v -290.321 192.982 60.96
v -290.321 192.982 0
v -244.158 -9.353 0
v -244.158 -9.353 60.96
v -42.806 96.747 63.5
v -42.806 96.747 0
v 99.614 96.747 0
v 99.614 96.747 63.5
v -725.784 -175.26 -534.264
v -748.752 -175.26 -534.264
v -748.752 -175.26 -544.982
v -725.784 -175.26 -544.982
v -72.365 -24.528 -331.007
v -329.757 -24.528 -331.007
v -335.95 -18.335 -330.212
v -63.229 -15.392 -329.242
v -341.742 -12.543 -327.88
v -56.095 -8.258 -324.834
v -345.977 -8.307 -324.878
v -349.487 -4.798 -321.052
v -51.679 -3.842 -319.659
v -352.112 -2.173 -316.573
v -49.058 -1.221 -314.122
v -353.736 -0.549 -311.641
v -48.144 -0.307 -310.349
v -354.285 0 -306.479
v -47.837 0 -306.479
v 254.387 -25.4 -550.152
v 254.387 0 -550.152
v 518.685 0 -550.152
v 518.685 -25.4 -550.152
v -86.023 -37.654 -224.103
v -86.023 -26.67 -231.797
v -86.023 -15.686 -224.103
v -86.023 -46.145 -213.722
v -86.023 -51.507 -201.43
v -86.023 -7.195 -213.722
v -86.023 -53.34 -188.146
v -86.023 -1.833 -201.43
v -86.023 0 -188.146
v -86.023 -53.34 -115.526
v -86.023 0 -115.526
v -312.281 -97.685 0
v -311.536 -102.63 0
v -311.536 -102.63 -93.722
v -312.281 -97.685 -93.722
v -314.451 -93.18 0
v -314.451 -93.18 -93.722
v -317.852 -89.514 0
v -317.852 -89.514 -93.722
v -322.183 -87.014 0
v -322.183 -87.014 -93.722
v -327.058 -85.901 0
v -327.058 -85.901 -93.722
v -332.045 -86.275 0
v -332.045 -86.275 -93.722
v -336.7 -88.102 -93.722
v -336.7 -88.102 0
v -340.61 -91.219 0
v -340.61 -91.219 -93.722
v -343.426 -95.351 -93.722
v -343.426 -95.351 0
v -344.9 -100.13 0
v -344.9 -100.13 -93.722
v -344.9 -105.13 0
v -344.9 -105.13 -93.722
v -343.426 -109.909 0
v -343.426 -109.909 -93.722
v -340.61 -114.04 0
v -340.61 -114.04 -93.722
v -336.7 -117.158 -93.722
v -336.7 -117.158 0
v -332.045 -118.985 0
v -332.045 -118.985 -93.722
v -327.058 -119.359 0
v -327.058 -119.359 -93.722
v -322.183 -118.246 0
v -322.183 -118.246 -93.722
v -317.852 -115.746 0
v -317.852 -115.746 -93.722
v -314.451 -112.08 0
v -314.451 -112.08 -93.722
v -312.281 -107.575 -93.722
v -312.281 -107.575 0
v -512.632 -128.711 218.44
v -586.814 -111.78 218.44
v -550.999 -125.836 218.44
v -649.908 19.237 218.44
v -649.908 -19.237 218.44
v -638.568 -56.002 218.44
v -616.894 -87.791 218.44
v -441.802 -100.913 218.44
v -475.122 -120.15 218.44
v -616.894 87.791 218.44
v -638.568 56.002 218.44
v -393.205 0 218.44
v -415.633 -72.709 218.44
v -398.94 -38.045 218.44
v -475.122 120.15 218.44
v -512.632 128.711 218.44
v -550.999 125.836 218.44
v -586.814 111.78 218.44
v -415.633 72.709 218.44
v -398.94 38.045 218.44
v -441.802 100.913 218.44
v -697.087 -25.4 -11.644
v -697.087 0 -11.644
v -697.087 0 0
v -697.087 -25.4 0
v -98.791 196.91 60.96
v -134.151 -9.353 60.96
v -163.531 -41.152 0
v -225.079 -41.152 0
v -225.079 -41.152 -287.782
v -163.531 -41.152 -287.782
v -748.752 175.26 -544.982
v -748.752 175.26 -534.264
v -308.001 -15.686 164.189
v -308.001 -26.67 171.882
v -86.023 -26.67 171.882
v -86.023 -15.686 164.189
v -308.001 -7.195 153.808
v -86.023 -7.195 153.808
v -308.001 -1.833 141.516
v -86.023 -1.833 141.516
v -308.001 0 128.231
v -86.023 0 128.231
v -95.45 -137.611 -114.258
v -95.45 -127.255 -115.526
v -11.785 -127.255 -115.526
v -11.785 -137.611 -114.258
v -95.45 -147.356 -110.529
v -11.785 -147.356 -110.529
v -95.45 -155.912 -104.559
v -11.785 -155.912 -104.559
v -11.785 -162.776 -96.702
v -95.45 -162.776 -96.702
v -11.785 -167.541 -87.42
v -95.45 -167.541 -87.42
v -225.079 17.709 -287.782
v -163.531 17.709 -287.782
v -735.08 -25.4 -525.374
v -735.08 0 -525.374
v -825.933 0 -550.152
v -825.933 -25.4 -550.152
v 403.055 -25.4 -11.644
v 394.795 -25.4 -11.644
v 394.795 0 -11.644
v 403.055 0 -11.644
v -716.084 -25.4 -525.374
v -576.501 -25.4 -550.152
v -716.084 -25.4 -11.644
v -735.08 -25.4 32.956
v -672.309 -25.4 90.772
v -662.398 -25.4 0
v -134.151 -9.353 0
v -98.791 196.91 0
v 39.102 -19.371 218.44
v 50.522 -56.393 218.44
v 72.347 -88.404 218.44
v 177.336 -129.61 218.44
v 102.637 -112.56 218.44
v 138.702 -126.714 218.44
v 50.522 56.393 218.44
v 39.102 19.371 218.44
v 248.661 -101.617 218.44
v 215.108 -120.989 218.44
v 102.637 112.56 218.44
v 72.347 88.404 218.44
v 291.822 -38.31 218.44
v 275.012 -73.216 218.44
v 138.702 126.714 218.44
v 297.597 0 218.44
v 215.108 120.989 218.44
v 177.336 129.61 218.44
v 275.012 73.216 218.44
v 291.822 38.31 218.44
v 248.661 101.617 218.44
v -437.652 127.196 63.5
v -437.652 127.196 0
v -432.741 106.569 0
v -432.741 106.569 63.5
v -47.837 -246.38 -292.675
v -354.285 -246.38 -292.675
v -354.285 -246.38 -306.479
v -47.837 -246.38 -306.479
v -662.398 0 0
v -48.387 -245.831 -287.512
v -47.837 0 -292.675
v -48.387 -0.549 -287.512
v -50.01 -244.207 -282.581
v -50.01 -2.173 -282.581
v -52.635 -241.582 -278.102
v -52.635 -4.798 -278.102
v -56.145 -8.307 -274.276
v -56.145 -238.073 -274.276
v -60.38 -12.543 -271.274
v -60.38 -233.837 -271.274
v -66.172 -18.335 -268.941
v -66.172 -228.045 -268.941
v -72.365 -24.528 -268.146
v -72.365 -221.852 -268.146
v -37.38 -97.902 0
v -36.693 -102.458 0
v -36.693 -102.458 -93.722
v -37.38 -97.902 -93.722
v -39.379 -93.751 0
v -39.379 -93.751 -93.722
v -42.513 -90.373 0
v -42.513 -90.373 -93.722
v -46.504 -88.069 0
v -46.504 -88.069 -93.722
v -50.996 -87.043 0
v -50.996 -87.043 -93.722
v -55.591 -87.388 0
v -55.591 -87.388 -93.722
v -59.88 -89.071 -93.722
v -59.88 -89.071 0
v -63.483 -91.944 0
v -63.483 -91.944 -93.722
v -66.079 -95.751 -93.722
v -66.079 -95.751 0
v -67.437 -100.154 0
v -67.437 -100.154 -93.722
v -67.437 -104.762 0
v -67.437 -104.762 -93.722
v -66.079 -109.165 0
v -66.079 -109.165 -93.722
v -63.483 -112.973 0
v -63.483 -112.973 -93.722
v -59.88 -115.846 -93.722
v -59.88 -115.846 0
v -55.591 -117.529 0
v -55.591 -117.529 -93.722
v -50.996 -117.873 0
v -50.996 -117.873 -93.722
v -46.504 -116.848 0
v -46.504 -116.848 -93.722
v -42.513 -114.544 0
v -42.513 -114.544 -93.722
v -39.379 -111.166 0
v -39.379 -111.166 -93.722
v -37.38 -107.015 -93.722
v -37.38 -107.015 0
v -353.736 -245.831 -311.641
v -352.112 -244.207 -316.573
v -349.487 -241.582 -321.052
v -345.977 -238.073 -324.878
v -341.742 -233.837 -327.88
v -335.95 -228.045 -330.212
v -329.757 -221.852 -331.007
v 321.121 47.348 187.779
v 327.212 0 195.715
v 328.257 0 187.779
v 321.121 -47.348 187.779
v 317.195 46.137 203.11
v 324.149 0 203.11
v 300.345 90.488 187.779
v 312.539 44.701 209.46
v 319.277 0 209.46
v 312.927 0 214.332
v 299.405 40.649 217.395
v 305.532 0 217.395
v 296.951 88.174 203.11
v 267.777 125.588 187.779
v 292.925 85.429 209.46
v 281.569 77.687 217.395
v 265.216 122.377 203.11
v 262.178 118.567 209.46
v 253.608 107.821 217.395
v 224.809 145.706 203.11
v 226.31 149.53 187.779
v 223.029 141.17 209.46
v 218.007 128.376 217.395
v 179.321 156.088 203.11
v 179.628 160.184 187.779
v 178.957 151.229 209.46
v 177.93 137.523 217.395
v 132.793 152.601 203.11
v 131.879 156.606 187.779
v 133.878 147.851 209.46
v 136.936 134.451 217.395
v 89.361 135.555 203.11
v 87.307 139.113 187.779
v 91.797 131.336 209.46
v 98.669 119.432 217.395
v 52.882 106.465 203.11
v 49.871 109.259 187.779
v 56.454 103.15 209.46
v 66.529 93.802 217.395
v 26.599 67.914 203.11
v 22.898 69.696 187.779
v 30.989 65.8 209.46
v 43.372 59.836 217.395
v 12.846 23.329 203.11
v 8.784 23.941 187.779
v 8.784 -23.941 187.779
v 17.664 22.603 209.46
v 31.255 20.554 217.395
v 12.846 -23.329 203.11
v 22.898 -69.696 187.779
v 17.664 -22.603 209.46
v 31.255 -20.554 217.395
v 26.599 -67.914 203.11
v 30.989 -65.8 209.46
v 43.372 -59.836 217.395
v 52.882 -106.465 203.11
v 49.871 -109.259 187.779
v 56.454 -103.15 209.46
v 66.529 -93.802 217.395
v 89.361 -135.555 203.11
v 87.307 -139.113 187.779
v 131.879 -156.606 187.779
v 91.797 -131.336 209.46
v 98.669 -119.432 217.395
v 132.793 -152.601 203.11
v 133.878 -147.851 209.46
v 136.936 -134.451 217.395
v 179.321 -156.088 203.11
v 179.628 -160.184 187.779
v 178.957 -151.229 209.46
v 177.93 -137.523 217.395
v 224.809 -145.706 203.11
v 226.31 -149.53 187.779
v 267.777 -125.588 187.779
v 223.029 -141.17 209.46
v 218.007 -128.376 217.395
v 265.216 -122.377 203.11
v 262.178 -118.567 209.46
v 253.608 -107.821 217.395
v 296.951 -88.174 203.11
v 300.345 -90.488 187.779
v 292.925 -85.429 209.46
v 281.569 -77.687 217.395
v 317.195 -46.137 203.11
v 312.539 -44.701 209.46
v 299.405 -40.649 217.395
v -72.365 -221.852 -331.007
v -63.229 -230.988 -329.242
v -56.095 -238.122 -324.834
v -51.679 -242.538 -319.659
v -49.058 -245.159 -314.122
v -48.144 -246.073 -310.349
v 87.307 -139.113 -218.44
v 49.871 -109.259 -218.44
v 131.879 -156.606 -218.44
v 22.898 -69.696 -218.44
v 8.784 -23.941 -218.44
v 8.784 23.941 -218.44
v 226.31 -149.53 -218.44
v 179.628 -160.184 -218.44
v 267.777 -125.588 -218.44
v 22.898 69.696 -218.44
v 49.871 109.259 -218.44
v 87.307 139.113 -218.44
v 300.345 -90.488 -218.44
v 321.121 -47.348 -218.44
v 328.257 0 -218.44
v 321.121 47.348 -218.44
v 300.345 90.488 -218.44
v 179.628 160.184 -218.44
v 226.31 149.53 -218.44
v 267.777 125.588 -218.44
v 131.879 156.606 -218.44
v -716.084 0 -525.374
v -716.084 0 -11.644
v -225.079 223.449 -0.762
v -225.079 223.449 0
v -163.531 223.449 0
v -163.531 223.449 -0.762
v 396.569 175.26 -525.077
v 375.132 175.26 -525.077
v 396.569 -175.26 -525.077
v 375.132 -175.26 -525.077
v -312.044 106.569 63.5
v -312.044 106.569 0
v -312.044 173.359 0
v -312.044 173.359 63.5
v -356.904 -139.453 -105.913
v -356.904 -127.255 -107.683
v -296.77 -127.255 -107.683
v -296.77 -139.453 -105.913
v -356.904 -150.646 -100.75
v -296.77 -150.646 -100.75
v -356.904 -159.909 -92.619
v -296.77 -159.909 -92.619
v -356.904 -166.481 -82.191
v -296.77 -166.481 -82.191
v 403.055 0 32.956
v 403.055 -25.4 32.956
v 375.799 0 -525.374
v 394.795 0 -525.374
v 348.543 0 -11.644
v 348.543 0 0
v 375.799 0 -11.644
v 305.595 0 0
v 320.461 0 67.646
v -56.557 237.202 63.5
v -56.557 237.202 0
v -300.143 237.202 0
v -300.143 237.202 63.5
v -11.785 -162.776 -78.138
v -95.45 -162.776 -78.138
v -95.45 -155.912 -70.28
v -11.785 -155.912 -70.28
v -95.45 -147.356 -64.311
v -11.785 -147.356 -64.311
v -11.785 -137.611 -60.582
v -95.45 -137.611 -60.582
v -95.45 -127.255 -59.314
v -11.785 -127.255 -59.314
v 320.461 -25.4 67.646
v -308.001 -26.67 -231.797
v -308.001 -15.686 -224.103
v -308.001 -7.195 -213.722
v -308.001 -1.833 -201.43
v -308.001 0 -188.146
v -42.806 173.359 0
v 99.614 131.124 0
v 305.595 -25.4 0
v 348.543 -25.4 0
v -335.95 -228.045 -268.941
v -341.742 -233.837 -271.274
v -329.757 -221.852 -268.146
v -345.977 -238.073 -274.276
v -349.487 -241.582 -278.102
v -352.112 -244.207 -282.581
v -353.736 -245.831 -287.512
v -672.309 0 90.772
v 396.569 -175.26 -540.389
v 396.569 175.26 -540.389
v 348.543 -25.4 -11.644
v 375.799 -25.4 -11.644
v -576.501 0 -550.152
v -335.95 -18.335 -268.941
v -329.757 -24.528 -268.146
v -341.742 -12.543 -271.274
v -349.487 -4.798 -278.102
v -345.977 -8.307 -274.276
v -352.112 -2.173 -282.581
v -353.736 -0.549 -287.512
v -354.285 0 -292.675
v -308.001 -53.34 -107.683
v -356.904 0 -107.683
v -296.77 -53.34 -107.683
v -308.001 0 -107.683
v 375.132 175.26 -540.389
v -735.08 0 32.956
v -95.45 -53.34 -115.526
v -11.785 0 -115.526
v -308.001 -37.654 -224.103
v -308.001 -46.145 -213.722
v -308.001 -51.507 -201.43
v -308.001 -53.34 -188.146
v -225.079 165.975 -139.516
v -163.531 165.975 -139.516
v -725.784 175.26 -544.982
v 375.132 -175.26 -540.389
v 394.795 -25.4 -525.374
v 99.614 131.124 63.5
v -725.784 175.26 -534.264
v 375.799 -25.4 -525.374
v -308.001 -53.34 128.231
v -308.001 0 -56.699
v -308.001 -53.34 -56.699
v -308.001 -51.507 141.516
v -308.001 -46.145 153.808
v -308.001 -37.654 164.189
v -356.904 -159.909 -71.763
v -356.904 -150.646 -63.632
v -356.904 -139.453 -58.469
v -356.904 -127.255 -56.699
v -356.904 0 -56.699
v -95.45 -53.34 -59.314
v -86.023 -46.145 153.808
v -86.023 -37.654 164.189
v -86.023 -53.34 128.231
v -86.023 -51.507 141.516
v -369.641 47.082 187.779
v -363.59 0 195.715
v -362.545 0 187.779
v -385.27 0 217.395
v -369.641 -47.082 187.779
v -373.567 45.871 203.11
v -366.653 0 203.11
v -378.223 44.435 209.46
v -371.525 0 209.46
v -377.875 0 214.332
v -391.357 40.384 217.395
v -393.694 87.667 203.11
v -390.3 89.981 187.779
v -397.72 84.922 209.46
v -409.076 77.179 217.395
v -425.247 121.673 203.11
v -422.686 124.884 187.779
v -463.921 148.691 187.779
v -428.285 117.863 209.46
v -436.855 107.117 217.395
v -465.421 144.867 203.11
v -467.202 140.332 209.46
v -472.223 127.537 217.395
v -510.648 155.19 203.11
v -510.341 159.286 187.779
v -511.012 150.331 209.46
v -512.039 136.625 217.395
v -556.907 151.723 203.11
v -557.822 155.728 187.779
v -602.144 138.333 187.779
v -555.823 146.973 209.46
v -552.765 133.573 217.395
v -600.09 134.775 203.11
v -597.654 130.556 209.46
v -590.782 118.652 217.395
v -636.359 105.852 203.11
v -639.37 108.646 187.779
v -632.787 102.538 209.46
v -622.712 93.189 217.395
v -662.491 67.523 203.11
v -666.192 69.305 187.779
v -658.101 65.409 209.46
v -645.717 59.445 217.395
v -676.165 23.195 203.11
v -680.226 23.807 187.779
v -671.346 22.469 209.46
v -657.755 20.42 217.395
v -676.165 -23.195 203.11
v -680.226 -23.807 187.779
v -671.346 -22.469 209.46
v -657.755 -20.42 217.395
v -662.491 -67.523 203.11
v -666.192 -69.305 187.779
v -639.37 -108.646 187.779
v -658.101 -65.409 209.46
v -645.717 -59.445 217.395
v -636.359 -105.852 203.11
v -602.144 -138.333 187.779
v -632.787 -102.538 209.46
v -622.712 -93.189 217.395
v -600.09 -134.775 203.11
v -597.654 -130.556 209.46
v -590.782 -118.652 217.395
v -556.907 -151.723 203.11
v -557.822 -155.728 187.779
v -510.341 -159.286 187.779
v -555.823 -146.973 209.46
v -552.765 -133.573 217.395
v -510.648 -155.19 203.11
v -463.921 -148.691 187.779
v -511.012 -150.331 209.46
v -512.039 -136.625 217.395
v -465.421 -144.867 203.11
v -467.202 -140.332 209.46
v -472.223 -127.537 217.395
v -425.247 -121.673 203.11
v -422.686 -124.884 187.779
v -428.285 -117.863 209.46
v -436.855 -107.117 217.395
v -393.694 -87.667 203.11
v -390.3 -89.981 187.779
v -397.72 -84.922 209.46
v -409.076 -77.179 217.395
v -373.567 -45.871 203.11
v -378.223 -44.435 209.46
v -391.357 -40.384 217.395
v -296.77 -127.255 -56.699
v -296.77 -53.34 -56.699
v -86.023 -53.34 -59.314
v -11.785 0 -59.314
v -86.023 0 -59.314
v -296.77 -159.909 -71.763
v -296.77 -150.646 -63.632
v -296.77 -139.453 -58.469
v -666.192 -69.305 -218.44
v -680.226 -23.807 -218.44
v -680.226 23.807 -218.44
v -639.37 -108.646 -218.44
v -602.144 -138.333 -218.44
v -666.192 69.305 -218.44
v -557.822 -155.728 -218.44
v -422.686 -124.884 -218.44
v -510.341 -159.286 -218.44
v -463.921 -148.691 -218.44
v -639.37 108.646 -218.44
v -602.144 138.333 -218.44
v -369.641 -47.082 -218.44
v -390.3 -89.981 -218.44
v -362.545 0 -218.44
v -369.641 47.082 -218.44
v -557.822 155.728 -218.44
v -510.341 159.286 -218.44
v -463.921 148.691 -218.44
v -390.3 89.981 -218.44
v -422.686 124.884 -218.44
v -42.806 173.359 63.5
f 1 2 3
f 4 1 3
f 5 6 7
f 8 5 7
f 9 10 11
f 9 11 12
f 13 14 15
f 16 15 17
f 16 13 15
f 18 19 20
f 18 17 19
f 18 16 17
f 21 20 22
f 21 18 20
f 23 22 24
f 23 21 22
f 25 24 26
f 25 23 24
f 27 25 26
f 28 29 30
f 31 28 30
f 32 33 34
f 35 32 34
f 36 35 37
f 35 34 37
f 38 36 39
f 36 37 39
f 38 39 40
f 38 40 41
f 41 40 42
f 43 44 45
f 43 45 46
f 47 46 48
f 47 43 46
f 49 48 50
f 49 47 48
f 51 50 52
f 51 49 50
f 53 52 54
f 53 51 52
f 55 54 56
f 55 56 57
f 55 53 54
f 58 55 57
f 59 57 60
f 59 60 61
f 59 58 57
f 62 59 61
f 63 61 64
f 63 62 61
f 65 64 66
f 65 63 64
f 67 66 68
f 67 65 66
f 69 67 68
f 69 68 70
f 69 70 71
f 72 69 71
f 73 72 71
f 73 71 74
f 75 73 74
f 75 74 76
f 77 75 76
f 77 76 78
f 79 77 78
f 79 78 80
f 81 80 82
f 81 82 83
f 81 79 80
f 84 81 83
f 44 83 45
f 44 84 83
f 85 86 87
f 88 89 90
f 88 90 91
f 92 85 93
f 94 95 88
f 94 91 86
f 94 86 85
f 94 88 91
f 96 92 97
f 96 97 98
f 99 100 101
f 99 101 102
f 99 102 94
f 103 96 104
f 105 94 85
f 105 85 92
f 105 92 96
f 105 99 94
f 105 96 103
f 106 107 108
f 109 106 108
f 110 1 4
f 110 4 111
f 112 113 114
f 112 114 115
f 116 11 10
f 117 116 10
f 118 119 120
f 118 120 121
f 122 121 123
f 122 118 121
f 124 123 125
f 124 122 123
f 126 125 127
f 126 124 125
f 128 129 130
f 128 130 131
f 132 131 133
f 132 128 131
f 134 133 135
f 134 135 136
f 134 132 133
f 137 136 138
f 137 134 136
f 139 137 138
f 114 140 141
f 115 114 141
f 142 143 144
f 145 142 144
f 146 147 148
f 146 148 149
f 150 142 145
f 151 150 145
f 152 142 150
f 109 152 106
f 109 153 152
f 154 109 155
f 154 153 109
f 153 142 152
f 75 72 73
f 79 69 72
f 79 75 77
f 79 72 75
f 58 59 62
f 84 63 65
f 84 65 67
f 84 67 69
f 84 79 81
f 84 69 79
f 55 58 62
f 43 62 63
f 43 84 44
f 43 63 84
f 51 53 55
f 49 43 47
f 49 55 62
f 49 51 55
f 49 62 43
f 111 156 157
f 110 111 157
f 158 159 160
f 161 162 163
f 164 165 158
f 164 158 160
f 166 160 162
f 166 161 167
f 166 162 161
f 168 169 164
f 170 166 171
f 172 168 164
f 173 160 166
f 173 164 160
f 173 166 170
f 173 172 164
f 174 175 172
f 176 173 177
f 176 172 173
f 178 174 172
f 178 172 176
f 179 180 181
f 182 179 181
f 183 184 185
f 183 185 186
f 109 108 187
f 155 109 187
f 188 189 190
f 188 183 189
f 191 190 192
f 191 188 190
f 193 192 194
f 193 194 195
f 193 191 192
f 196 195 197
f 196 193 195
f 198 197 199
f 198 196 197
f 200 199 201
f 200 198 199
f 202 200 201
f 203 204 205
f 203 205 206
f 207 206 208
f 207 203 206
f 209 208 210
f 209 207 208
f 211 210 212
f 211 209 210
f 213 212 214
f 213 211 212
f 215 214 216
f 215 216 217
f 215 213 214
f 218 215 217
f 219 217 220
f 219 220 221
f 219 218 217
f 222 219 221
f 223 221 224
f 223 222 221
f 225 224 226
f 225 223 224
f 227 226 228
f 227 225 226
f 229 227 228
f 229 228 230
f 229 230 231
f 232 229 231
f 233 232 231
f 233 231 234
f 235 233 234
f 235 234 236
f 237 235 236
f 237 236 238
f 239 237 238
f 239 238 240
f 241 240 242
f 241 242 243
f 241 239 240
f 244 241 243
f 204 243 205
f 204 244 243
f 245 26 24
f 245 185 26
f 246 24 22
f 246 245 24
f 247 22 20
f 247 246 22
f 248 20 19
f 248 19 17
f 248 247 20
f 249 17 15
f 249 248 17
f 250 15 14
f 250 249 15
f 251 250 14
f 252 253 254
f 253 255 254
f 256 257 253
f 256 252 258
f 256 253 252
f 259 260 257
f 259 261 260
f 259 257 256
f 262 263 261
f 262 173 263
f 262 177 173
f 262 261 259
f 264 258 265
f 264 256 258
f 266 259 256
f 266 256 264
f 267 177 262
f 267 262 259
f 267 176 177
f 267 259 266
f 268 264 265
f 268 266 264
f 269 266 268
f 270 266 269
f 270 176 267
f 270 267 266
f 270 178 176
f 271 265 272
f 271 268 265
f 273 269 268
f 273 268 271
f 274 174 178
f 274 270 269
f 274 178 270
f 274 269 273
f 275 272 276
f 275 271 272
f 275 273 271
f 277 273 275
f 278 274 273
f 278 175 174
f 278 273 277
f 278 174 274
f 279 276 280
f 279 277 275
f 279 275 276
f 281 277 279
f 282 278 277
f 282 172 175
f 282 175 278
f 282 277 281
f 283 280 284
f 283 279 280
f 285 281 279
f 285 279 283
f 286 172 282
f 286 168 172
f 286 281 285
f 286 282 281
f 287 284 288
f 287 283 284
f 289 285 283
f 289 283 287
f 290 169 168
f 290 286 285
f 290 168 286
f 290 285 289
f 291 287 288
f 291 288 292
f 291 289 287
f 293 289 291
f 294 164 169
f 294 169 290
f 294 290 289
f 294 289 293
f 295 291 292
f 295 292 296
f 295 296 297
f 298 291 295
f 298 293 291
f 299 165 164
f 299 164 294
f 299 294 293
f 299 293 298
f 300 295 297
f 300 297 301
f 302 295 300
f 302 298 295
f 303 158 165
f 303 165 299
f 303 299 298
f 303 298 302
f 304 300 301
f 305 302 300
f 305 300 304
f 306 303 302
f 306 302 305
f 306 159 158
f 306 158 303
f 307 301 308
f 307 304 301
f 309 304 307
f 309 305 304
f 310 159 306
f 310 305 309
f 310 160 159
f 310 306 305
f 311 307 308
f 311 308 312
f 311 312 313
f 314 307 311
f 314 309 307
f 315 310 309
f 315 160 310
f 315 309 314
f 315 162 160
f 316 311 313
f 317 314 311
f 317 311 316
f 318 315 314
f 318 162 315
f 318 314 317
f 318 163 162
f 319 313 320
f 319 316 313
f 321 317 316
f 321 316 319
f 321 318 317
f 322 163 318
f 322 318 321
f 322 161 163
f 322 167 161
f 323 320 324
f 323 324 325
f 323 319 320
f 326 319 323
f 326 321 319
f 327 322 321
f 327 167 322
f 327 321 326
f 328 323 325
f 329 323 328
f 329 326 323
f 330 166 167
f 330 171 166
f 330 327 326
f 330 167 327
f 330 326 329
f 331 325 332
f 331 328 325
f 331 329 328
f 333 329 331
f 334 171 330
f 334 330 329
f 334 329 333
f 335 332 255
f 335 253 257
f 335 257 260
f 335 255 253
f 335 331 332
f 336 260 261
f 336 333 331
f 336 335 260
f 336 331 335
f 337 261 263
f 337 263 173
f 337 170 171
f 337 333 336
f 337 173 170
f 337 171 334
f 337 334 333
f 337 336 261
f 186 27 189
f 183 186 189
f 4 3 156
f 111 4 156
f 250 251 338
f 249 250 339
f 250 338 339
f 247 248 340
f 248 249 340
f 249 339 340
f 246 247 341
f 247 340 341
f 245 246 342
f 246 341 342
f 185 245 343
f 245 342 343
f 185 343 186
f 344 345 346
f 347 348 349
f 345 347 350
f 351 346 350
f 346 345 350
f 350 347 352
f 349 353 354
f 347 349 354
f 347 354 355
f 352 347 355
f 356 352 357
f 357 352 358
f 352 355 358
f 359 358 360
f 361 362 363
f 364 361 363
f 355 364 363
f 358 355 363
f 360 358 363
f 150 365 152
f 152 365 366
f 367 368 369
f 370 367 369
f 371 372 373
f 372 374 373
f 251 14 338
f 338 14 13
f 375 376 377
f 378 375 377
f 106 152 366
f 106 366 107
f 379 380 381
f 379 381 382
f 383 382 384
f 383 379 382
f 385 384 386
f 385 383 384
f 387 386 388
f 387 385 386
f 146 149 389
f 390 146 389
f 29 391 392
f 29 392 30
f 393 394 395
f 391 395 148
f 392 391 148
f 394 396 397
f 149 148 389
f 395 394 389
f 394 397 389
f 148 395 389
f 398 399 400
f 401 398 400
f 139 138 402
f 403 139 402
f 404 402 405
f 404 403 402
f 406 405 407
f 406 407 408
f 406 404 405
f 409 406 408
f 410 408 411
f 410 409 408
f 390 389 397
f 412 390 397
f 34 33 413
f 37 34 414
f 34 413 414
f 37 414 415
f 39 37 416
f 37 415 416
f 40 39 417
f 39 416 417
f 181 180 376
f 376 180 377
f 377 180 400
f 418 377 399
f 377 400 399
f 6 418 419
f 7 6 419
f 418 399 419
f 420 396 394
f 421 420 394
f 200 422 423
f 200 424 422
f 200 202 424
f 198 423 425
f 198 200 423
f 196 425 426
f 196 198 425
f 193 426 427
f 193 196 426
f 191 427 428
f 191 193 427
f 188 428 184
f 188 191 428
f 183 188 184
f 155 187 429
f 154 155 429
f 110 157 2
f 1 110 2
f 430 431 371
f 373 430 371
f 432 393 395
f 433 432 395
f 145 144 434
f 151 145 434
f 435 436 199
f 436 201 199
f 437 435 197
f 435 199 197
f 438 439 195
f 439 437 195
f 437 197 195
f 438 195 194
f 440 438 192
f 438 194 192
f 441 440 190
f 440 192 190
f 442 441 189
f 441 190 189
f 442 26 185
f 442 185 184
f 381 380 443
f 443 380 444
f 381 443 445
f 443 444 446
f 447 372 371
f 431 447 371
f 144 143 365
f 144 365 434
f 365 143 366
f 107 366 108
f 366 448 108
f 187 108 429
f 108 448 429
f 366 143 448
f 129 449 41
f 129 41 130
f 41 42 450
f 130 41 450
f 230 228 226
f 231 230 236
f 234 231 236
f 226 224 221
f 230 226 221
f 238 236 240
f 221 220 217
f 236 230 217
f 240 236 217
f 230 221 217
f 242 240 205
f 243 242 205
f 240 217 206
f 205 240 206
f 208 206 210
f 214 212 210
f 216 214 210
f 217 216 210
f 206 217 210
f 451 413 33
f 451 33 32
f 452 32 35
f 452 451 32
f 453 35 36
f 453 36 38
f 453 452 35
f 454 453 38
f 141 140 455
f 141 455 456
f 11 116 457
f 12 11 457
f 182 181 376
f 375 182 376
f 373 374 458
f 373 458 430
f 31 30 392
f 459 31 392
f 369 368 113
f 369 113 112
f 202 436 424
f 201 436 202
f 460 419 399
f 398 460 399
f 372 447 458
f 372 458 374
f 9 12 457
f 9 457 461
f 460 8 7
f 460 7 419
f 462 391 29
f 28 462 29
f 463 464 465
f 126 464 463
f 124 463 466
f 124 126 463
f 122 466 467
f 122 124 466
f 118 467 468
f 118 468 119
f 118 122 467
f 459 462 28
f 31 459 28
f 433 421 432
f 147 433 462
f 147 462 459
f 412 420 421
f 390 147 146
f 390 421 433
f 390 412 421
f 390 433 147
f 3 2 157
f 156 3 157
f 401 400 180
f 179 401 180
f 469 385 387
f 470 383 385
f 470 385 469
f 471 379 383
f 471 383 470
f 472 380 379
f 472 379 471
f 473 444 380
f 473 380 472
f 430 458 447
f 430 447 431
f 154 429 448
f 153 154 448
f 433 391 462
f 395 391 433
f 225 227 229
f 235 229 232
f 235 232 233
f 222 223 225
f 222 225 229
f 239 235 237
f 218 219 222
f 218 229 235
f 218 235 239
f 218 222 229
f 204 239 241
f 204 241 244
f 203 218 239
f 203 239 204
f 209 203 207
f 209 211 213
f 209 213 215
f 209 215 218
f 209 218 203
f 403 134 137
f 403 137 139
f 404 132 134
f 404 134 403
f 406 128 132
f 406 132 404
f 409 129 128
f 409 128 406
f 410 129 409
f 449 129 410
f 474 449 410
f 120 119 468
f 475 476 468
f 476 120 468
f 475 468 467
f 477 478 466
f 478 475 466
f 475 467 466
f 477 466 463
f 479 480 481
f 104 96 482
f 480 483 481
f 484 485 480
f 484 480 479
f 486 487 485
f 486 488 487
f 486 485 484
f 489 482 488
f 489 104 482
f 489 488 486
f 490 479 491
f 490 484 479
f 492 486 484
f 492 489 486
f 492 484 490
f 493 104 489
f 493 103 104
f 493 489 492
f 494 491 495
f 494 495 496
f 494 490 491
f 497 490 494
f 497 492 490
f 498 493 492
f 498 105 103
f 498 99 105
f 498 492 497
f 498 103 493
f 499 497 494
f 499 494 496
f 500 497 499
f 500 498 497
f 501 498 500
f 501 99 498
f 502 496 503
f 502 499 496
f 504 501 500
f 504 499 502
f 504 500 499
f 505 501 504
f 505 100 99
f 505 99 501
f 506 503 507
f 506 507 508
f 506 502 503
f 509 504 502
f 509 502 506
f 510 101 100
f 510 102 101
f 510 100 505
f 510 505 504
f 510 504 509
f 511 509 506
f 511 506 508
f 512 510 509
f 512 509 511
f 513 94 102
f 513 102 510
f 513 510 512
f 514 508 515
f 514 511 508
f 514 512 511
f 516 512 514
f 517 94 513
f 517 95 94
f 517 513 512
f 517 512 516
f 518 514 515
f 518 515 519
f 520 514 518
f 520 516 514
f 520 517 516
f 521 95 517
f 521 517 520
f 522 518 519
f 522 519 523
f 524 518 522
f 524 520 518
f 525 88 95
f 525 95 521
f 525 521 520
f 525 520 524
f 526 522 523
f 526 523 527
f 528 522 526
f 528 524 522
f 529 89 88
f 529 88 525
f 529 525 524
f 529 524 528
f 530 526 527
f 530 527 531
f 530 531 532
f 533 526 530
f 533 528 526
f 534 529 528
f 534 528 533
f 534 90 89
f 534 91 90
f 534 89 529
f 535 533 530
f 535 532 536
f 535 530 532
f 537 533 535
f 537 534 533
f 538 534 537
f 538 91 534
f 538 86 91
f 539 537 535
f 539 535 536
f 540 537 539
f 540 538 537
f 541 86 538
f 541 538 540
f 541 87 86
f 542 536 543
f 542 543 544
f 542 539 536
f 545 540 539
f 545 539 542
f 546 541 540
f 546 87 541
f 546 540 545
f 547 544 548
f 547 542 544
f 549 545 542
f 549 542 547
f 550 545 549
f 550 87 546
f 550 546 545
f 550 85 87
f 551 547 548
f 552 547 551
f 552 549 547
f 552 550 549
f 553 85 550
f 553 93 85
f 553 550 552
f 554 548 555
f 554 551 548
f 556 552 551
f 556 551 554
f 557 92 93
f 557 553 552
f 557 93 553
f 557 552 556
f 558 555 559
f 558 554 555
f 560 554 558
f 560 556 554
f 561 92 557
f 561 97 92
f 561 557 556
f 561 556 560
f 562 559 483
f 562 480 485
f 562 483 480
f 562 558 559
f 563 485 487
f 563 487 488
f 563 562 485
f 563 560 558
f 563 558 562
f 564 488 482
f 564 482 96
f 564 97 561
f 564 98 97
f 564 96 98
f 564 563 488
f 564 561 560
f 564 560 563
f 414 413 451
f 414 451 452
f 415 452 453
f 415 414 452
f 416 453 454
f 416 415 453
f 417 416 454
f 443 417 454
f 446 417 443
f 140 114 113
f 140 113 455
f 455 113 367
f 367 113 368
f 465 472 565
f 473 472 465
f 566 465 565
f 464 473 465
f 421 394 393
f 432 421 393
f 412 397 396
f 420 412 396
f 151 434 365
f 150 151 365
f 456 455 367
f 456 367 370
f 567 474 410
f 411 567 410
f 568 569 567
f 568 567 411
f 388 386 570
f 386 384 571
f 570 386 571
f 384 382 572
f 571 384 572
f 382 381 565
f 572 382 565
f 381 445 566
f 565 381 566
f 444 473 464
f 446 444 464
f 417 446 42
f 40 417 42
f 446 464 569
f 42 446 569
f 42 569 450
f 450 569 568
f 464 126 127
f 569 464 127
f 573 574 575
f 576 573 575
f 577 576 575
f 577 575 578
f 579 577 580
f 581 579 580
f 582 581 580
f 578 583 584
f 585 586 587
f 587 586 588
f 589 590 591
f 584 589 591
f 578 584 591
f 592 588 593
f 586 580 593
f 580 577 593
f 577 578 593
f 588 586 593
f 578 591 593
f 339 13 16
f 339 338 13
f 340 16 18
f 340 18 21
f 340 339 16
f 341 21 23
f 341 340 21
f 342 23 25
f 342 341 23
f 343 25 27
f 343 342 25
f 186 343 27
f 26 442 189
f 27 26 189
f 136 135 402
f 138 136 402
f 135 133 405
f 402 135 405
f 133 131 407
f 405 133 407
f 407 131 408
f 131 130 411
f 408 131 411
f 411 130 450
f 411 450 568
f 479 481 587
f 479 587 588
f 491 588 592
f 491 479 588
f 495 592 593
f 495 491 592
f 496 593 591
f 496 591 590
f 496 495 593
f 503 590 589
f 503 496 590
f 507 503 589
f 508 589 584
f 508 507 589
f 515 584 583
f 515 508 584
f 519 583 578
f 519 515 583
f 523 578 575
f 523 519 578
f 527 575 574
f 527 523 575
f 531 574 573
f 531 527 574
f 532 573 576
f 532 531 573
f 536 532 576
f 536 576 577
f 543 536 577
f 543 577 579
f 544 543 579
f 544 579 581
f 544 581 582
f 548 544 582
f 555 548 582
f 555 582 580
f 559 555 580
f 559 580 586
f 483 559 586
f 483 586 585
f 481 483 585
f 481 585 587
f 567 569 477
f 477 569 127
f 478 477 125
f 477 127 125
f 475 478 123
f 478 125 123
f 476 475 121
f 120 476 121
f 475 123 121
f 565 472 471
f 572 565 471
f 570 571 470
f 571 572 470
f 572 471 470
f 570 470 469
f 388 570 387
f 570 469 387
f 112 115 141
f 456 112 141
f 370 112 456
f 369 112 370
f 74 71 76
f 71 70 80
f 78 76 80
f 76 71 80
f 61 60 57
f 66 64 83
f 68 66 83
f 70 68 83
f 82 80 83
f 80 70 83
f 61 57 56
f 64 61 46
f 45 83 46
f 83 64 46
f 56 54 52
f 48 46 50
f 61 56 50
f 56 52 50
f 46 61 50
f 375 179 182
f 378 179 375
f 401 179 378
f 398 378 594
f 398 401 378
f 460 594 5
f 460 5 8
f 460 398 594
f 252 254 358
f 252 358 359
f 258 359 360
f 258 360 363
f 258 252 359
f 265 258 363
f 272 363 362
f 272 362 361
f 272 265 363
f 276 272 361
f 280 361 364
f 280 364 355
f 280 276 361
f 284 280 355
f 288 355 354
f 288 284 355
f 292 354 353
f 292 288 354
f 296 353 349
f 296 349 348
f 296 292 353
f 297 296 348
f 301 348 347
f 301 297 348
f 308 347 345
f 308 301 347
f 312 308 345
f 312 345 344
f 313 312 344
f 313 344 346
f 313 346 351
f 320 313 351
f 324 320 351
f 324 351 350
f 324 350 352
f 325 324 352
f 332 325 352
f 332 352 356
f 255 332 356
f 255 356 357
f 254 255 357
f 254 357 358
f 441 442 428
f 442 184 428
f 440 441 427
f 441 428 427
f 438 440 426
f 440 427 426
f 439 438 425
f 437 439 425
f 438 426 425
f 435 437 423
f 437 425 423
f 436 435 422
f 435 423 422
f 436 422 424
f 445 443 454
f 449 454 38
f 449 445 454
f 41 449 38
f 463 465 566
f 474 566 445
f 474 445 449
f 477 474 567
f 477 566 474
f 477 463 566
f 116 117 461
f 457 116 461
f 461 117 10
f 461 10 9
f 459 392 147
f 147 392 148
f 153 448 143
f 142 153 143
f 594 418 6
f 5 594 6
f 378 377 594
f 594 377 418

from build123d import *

# Parameters (mm, degrees)
F0_R         = 160.6336286285
F1_DEPTH     = 218.44
F0_R_2       = 159.7328245583
F3_DEPTH     = 63.5
F4_W         = 221.9782620668
F4_H         = 414.4903868437
F5_DEPTH     = 53.34
F6_T1_DEPTH  = 467.2623600039
F8_DEPTH     = 60.96
F4_W_2       = 306.4478710294
F4_H_2       = 62.861084938
F9_DEPTH     = 246.38
F10_R        = 24.5284097937
F11_W        = 61.5484267473
F11_H        = 264.6007202566
F12_DEPTH    = 287.782
F13_SIZE     = 205.74
F14_SIZE     = 81.28
F19_W        = 18.9964473248
F19_H        = 513.7299746275
F20_DEPTH    = 25.4
F21_W        = 22.9676365852
F21_H        = 10.7182264328
F22_DEPTH    = 175.26
F21_W_2      = 21.4364528656
F21_H_2      = 15.3118371964
F23_W        = 83.6651213467
F23_H        = 56.2124997377
F23_W_2      = 60.1342916489
F23_H_2      = 50.9834252298
F24_DEPTH    = 170.18
F25_T1_DEPTH = 274.7578773438
F25_T3_DEPTH = 298.2887070417
F26_R        = 30.6605122421
F26_2_R      = 30.6605122421
F27_R        = 16.7759014108
F28_DEPTH    = 93.722416088
F27_R_2      = 15.45819276


# Not quite as in the source:
# - a fillet or chamfer that OpenCascade refuses, or shapes differently, is made with other operations: its cross-section is extruded or revolved along the edge and cut away or added
# - the program builds the solid bodies; features that only make, move or delete a surface that nothing else refers to are left out


with BuildPart() as f1:
    # F0 (on Top) → F1 (new body, symmetric)
    with BuildSketch(Plane.XY):
        with Locations((167.6235944033, 0)):
            Circle(F0_R)
    extrude(amount=F1_DEPTH, both=True)

    # F26
    f26_edges = [f1.edges().sort_by_distance(p)[0] for p in [
        (6.989966, 0, 218.44),
    ]]
    fillet(f26_edges, radius=F26_R)


with BuildPart() as f1b:
    # F0 (on Top) → F1, piece 2 (new body, symmetric)
    with BuildSketch(Plane.XY):
        with Locations((-522.2776532173, 0)):
            Circle(F0_R_2)
    extrude(amount=F1_DEPTH, both=True)

    # F26#2
    f26_2_edges = [f1b.edges().sort_by_distance(p)[0] for p in [
        (-682.010478, 0, 218.44),
    ]]
    fillet(f26_2_edges, radius=F26_2_R)


with BuildPart() as f3:
    # F2 (on Top) → F3 (new body)
    with BuildSketch(Plane.XY):
        Polygon((-300.143301487, 237.2024357319), (-437.6519620419, 127.195507288), (-432.7409267426, 106.5692082047), (-312.0444483441, 106.5692082047), (-312.0444483441, 173.3591258526), (-42.8056791425, 173.3591258526), (-42.8056791425, 96.7471674085), (99.6140241623, 96.7471674085), (99.6140241623, 131.1243325472), (-56.5565414727, 237.2024357319), align=None)
    extrude(amount=F3_DEPTH)


with BuildPart() as f5:
    # F4 (on Front) → F5 (new body)
    with BuildSketch(Plane.XZ):
        with Locations((-197.0118135214, -29.95724231)):
            Rectangle(F4_W, F4_H)
    extrude(amount=F5_DEPTH)

    # F6: fillet of radius 49.0568195874 on 4 edges, made by hand

    # F6_s2 → F6_t1 (cut)
    with BuildSketch(Plane.YZ.offset(-430.6429935234)):
        with BuildLine():
            ThreePointArc((-49.0568195874, -237.2024357319), (-14.3684097937, -222.8340259382), (0, -188.1456161445))
            Line((0, -188.1456161445), (0, -237.2024357319))
            Line((0, -237.2024357319), (-49.0568195874, -237.2024357319))
        make_face()
        with BuildLine():
            ThreePointArc((-4.2831804126, -237.2024357319), (-38.9715902063, -222.8340259382), (-53.34, -188.1456161445))
            Line((-53.34, -188.1456161445), (-53.34, -237.2024357319))
            Line((-53.34, -237.2024357319), (-4.2831804126, -237.2024357319))
        make_face()
        with BuildLine():
            ThreePointArc((-4.2831804126, 177.2879511118), (-38.9715902063, 162.9195413181), (-53.34, 128.2311315244))
            Line((-53.34, 128.2311315244), (-53.34, 177.2879511118))
            Line((-53.34, 177.2879511118), (-4.2831804126, 177.2879511118))
        make_face()
        with BuildLine():
            ThreePointArc((-49.0568195874, 177.2879511118), (-14.3684097937, 162.9195413181), (0, 128.2311315244))
            Line((0, 128.2311315244), (0, 177.2879511118))
            Line((0, 177.2879511118), (-49.0568195874, 177.2879511118))
        make_face()
    extrude(amount=F6_T1_DEPTH, mode=Mode.SUBTRACT)

    # F23 (on Front) → F24 (join)
    with BuildSketch(Plane.XZ):
        with Locations((-53.6179151386, -87.4198973179)):
            Rectangle(F23_W, F23_H)
        with Locations((-326.8368244171, -82.1908283979)):
            Rectangle(F23_W_2, F23_H_2)
    extrude(amount=F24_DEPTH)

    # F25: fillet of radius 42.924717139 on 4 edges, made by hand

    # F25_s2 → F25_t1 (cut)
    with BuildSketch(Plane.YZ.offset(-464.215763089)):
        with BuildLine():
            ThreePointArc((-127.255282861, -56.699115783), (-157.6076414305, -69.2714743525), (-170.18, -99.623832922))
            Line((-170.18, -99.623832922), (-170.18, -56.699115783))
            Line((-170.18, -56.699115783), (-127.255282861, -56.699115783))
        make_face()
        with BuildLine():
            ThreePointArc((-127.255282861, -107.6825410128), (-157.6076414305, -95.1101824433), (-170.18, -64.7578238738))
            Line((-170.18, -64.7578238738), (-170.18, -107.6825410128))
            Line((-170.18, -107.6825410128), (-127.255282861, -107.6825410128))
        make_face()
    extrude(amount=F25_T1_DEPTH, mode=Mode.SUBTRACT)

    # F25_s4 → F25_t3 (cut)
    with BuildSketch(Plane.YZ.offset(-202.7622686594)):
        with BuildLine():
            ThreePointArc((-170.18, -102.238364588), (-157.6076414305, -71.8860060185), (-127.255282861, -59.313647449))
            Line((-127.255282861, -59.313647449), (-170.18, -59.313647449))
            Line((-170.18, -59.313647449), (-170.18, -102.238364588))
        make_face()
        with BuildLine():
            ThreePointArc((-127.255282861, -115.5261471868), (-157.6076414305, -102.9537886173), (-170.18, -72.6014300478))
            Line((-170.18, -72.6014300478), (-170.18, -115.5261471868))
            Line((-170.18, -115.5261471868), (-127.255282861, -115.5261471868))
        make_face()
    extrude(amount=F25_T3_DEPTH, mode=Mode.SUBTRACT)


with BuildPart() as f8:
    # F7 (on Top) → F8 (new body)
    with BuildSketch(Plane.XY):
        Polygon((-98.7913385034, 196.9104707241), (-290.3212606907, 192.9816454649), (-244.1576421261, -9.3525238335), (-134.1507136822, -9.3525238335), align=None)
    extrude(amount=F8_DEPTH)


with BuildPart() as f9:
    # F4 (on Front) → F9 (new body)
    with BuildSketch(Plane.XZ):
        with Locations((-201.0610103607, -299.5766699314)):
            Rectangle(F4_W_2, F4_H_2)
    extrude(amount=F9_DEPTH)

    # F10
    f10_edges = [f9.edges().sort_by_distance(p)[0] for p in [
        (-354.284946, -123.19, -268.146127),
        (-354.284946, -123.19, -331.007212),
        (-47.837075, -123.19, -268.146127),
        (-47.837075, -123.19, -331.007212),
        (-201.06101, -246.38, -268.146127),
        (-201.06101, -246.38, -331.007212),
        (-201.06101, 0, -268.146127),
        (-201.06101, 0, -331.007212),
    ]]
    fillet(f10_edges, radius=F10_R)


with BuildPart() as f12:
    # F11 (on Top) → F12 (new body)
    with BuildSketch(Plane.XY):
        with Locations((-194.3048760295, 91.1482293159)):
            Rectangle(F11_W, F11_H)
    extrude(amount=-F12_DEPTH)

    # F13
    f13_edges = [f12.edges().sort_by_distance(p)[0] for p in [
        (-194.304876, 223.448589, -287.782),
    ]]
    chamfer(f13_edges, length=F13_SIZE)

    # F14
    f14_edges = [f12.edges().sort_by_distance(p)[0] for p in [
        (-194.304876, 223.448589, -82.042),
    ]]
    chamfer(f14_edges, length=F14_SIZE)


with BuildPart() as f20:
    # F19 (on Front) → F20 (new body)
    with BuildSketch(Plane.XZ):
        Polygon((-662.3982787132, 0), (-672.3094582558, 90.7716751099), (-735.0803017616, 32.9563878477), (-735.0803017616, -11.643961072), (-716.0838544369, -11.643961072), (-697.0874071121, -11.643961072), (-697.0874071121, 0), align=None)
        with Locations((-725.5820780993, -268.5089483857)):
            Rectangle(F19_W, F19_H)
        Polygon((-716.0838544369, -525.3739356995), (-735.0803017616, -525.3739356995), (-825.9328603745, -550.1518845558), (-576.5013098717, -550.1518845558), align=None)
    extrude(amount=F20_DEPTH)


with BuildPart() as f20b:
    # F19 (on Front) → F20, piece 2 (new body)
    with BuildSketch(Plane.XZ):
        Polygon((403.0545651913, 32.9563878477), (320.4613029957, 67.6455572248), (305.5945038795, 0), (348.5430181026, 0), (348.5430181026, -11.643961072), (375.798791647, -11.643961072), (394.7952389717, -11.643961072), (403.0545651913, -11.643961072), align=None)
        with Locations((385.2970153093, -268.5089483857)):
            Rectangle(F19_W, F19_H)
        Polygon((518.6851024628, -550.1518845558), (394.7952389717, -525.3739356995), (375.798791647, -525.3739356995), (254.3867230415, -550.1518845558), align=None)
    extrude(amount=F20_DEPTH)


with BuildPart() as f22:
    # F21 (on Front) → F22 (new body, symmetric)
    with BuildSketch(Plane.XZ):
        with Locations((-737.2682392597, -539.6229028702)):
            Rectangle(F21_W, F21_H)
    extrude(amount=F22_DEPTH, both=True)


with BuildPart() as f22b:
    # F21 (on Front) → F22, piece 2 (new body, symmetric)
    with BuildSketch(Plane.XZ):
        with Locations((385.8506381512, -532.7326059341)):
            Rectangle(F21_W_2, F21_H_2)
    extrude(amount=F22_DEPTH, both=True)


with BuildPart() as f28:
    # F27 (on Top) → F28 (new body)
    with BuildSketch(Plane.XY):
        with Locations((-328.311920166, -102.629929781)):
            Circle(F27_R)
    extrude(amount=-F28_DEPTH)


with BuildPart() as f28b:
    # F27 (on Top) → F28, piece 2 (new body)
    with BuildSketch(Plane.XY):
        with Locations((-52.1512031555, -102.4584174156)):
            Circle(F27_R_2)
    extrude(amount=-F28_DEPTH)


solid = Compound([f1.part, f1b.part, f3.part, f5.part, f8.part, f9.part, f12.part, f20.part, f20b.part, f22.part, f22b.part, f28.part, f28b.part])
